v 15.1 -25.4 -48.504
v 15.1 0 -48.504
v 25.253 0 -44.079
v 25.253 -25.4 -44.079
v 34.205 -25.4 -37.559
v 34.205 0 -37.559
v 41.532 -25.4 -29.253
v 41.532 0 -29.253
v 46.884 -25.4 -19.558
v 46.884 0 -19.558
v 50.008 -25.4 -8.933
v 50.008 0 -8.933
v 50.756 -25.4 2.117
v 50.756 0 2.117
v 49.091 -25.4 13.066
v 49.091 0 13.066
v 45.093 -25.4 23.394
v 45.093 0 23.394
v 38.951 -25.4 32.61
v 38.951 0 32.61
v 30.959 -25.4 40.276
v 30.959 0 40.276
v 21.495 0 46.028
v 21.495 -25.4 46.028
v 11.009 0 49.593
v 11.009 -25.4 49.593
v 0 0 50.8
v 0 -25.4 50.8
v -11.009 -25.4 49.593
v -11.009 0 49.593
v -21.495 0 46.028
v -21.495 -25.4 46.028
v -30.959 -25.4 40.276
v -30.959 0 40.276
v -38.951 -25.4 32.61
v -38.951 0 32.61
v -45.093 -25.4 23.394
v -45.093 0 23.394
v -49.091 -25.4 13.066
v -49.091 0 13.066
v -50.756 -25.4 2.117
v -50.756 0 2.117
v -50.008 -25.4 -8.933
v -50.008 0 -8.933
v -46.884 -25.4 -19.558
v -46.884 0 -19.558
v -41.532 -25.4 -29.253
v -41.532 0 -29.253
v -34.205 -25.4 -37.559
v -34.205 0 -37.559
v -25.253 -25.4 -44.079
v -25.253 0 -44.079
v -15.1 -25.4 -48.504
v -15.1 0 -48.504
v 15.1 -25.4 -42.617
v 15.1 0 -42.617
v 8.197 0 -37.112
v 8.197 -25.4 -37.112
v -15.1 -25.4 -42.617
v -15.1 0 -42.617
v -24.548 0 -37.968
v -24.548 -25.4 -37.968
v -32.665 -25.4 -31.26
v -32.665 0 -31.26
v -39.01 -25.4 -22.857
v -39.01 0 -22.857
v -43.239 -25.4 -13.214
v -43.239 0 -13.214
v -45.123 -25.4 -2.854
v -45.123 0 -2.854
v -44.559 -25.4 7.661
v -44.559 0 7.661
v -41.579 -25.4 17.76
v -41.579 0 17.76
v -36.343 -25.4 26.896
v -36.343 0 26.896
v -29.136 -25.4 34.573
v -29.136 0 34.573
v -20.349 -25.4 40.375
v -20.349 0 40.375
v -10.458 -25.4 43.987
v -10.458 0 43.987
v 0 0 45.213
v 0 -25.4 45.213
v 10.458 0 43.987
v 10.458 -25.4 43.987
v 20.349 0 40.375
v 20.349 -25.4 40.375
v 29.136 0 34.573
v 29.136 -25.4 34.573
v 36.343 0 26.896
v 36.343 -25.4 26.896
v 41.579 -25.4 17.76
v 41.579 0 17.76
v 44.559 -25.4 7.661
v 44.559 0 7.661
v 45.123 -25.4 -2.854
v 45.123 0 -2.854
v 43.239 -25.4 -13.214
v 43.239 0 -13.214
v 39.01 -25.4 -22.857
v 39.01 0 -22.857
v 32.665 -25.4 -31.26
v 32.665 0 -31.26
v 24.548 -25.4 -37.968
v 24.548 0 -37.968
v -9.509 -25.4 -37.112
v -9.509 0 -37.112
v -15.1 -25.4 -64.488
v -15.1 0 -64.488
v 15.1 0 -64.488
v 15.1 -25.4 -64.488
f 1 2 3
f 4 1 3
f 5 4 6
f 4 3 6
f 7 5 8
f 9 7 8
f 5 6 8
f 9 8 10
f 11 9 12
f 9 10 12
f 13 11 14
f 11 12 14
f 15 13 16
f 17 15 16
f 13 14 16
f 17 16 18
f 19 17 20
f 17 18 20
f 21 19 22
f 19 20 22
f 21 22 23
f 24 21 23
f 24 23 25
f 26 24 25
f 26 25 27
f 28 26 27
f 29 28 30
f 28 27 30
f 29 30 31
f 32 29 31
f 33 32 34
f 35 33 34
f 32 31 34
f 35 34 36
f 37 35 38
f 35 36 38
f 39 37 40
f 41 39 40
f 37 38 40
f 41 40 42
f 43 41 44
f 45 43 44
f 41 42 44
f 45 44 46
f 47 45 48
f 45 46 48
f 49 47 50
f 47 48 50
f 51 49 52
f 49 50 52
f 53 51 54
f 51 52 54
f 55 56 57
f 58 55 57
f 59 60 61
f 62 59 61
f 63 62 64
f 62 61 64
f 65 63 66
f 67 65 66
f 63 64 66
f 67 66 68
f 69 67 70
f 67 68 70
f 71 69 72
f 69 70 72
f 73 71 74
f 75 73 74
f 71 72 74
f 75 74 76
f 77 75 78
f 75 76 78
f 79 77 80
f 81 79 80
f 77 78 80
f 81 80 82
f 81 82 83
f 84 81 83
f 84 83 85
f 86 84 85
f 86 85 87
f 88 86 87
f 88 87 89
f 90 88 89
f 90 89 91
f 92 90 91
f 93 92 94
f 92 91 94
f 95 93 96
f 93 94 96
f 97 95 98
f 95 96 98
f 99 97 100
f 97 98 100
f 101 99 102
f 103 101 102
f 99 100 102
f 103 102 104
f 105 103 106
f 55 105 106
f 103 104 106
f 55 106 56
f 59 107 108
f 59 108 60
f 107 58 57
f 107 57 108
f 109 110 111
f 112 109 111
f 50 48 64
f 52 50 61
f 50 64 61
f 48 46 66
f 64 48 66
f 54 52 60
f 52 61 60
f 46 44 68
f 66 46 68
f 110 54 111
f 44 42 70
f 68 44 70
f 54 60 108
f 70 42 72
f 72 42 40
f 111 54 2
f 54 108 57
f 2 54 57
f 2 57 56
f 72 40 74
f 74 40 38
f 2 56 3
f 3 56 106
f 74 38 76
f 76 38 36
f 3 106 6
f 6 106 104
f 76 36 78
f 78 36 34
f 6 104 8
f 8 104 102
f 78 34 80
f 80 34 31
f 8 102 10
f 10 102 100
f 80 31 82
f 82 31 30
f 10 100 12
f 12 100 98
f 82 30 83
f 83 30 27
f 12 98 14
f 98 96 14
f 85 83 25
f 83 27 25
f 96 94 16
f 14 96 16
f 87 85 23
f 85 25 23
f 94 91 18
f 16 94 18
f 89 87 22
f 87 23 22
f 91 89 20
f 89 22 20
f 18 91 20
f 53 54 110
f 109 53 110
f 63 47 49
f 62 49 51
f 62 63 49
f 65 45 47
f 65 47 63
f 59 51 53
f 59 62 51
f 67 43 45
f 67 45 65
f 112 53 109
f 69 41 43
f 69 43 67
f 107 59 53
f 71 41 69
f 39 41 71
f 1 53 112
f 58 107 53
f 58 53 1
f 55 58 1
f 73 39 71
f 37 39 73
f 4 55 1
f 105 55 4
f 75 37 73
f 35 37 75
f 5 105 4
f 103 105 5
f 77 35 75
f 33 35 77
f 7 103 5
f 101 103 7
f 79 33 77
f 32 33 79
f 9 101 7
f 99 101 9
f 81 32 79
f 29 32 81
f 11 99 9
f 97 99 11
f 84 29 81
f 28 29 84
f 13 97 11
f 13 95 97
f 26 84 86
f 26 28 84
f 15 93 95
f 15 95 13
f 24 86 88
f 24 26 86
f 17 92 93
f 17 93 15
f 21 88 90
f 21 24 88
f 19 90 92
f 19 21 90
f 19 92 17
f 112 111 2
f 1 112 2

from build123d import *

# Parameters (mm, degrees)
F1_DEPTH = 25.4


with BuildPart() as f1:
    # F0 (on Front) → F1 (new body)
    with BuildSketch(Plane.XZ):
        with BuildLine():
            Line((15.1003, -42.616936), (15.1003, -48.503824))
            ThreePointArc((15.1003, -48.503824), (0, 50.8), (-15.1003, -48.503824))
            Line((-15.1003, -48.503824), (-15.1003, -42.616936))
            ThreePointArc((-15.1003, -42.616936), (0, 45.213076), (15.1003, -42.616936))
        make_face()
        Polygon((15.1003, -64.487577), (15.1003, -48.503824), (15.1003, -42.616936), (8.197113, -37.112423), (-9.508923, -37.112423), (-15.1003, -42.616936), (-15.1003, -48.503824), (-15.1003, -64.487577), align=None)
    extrude(amount=F1_DEPTH)


solid = f1.part
